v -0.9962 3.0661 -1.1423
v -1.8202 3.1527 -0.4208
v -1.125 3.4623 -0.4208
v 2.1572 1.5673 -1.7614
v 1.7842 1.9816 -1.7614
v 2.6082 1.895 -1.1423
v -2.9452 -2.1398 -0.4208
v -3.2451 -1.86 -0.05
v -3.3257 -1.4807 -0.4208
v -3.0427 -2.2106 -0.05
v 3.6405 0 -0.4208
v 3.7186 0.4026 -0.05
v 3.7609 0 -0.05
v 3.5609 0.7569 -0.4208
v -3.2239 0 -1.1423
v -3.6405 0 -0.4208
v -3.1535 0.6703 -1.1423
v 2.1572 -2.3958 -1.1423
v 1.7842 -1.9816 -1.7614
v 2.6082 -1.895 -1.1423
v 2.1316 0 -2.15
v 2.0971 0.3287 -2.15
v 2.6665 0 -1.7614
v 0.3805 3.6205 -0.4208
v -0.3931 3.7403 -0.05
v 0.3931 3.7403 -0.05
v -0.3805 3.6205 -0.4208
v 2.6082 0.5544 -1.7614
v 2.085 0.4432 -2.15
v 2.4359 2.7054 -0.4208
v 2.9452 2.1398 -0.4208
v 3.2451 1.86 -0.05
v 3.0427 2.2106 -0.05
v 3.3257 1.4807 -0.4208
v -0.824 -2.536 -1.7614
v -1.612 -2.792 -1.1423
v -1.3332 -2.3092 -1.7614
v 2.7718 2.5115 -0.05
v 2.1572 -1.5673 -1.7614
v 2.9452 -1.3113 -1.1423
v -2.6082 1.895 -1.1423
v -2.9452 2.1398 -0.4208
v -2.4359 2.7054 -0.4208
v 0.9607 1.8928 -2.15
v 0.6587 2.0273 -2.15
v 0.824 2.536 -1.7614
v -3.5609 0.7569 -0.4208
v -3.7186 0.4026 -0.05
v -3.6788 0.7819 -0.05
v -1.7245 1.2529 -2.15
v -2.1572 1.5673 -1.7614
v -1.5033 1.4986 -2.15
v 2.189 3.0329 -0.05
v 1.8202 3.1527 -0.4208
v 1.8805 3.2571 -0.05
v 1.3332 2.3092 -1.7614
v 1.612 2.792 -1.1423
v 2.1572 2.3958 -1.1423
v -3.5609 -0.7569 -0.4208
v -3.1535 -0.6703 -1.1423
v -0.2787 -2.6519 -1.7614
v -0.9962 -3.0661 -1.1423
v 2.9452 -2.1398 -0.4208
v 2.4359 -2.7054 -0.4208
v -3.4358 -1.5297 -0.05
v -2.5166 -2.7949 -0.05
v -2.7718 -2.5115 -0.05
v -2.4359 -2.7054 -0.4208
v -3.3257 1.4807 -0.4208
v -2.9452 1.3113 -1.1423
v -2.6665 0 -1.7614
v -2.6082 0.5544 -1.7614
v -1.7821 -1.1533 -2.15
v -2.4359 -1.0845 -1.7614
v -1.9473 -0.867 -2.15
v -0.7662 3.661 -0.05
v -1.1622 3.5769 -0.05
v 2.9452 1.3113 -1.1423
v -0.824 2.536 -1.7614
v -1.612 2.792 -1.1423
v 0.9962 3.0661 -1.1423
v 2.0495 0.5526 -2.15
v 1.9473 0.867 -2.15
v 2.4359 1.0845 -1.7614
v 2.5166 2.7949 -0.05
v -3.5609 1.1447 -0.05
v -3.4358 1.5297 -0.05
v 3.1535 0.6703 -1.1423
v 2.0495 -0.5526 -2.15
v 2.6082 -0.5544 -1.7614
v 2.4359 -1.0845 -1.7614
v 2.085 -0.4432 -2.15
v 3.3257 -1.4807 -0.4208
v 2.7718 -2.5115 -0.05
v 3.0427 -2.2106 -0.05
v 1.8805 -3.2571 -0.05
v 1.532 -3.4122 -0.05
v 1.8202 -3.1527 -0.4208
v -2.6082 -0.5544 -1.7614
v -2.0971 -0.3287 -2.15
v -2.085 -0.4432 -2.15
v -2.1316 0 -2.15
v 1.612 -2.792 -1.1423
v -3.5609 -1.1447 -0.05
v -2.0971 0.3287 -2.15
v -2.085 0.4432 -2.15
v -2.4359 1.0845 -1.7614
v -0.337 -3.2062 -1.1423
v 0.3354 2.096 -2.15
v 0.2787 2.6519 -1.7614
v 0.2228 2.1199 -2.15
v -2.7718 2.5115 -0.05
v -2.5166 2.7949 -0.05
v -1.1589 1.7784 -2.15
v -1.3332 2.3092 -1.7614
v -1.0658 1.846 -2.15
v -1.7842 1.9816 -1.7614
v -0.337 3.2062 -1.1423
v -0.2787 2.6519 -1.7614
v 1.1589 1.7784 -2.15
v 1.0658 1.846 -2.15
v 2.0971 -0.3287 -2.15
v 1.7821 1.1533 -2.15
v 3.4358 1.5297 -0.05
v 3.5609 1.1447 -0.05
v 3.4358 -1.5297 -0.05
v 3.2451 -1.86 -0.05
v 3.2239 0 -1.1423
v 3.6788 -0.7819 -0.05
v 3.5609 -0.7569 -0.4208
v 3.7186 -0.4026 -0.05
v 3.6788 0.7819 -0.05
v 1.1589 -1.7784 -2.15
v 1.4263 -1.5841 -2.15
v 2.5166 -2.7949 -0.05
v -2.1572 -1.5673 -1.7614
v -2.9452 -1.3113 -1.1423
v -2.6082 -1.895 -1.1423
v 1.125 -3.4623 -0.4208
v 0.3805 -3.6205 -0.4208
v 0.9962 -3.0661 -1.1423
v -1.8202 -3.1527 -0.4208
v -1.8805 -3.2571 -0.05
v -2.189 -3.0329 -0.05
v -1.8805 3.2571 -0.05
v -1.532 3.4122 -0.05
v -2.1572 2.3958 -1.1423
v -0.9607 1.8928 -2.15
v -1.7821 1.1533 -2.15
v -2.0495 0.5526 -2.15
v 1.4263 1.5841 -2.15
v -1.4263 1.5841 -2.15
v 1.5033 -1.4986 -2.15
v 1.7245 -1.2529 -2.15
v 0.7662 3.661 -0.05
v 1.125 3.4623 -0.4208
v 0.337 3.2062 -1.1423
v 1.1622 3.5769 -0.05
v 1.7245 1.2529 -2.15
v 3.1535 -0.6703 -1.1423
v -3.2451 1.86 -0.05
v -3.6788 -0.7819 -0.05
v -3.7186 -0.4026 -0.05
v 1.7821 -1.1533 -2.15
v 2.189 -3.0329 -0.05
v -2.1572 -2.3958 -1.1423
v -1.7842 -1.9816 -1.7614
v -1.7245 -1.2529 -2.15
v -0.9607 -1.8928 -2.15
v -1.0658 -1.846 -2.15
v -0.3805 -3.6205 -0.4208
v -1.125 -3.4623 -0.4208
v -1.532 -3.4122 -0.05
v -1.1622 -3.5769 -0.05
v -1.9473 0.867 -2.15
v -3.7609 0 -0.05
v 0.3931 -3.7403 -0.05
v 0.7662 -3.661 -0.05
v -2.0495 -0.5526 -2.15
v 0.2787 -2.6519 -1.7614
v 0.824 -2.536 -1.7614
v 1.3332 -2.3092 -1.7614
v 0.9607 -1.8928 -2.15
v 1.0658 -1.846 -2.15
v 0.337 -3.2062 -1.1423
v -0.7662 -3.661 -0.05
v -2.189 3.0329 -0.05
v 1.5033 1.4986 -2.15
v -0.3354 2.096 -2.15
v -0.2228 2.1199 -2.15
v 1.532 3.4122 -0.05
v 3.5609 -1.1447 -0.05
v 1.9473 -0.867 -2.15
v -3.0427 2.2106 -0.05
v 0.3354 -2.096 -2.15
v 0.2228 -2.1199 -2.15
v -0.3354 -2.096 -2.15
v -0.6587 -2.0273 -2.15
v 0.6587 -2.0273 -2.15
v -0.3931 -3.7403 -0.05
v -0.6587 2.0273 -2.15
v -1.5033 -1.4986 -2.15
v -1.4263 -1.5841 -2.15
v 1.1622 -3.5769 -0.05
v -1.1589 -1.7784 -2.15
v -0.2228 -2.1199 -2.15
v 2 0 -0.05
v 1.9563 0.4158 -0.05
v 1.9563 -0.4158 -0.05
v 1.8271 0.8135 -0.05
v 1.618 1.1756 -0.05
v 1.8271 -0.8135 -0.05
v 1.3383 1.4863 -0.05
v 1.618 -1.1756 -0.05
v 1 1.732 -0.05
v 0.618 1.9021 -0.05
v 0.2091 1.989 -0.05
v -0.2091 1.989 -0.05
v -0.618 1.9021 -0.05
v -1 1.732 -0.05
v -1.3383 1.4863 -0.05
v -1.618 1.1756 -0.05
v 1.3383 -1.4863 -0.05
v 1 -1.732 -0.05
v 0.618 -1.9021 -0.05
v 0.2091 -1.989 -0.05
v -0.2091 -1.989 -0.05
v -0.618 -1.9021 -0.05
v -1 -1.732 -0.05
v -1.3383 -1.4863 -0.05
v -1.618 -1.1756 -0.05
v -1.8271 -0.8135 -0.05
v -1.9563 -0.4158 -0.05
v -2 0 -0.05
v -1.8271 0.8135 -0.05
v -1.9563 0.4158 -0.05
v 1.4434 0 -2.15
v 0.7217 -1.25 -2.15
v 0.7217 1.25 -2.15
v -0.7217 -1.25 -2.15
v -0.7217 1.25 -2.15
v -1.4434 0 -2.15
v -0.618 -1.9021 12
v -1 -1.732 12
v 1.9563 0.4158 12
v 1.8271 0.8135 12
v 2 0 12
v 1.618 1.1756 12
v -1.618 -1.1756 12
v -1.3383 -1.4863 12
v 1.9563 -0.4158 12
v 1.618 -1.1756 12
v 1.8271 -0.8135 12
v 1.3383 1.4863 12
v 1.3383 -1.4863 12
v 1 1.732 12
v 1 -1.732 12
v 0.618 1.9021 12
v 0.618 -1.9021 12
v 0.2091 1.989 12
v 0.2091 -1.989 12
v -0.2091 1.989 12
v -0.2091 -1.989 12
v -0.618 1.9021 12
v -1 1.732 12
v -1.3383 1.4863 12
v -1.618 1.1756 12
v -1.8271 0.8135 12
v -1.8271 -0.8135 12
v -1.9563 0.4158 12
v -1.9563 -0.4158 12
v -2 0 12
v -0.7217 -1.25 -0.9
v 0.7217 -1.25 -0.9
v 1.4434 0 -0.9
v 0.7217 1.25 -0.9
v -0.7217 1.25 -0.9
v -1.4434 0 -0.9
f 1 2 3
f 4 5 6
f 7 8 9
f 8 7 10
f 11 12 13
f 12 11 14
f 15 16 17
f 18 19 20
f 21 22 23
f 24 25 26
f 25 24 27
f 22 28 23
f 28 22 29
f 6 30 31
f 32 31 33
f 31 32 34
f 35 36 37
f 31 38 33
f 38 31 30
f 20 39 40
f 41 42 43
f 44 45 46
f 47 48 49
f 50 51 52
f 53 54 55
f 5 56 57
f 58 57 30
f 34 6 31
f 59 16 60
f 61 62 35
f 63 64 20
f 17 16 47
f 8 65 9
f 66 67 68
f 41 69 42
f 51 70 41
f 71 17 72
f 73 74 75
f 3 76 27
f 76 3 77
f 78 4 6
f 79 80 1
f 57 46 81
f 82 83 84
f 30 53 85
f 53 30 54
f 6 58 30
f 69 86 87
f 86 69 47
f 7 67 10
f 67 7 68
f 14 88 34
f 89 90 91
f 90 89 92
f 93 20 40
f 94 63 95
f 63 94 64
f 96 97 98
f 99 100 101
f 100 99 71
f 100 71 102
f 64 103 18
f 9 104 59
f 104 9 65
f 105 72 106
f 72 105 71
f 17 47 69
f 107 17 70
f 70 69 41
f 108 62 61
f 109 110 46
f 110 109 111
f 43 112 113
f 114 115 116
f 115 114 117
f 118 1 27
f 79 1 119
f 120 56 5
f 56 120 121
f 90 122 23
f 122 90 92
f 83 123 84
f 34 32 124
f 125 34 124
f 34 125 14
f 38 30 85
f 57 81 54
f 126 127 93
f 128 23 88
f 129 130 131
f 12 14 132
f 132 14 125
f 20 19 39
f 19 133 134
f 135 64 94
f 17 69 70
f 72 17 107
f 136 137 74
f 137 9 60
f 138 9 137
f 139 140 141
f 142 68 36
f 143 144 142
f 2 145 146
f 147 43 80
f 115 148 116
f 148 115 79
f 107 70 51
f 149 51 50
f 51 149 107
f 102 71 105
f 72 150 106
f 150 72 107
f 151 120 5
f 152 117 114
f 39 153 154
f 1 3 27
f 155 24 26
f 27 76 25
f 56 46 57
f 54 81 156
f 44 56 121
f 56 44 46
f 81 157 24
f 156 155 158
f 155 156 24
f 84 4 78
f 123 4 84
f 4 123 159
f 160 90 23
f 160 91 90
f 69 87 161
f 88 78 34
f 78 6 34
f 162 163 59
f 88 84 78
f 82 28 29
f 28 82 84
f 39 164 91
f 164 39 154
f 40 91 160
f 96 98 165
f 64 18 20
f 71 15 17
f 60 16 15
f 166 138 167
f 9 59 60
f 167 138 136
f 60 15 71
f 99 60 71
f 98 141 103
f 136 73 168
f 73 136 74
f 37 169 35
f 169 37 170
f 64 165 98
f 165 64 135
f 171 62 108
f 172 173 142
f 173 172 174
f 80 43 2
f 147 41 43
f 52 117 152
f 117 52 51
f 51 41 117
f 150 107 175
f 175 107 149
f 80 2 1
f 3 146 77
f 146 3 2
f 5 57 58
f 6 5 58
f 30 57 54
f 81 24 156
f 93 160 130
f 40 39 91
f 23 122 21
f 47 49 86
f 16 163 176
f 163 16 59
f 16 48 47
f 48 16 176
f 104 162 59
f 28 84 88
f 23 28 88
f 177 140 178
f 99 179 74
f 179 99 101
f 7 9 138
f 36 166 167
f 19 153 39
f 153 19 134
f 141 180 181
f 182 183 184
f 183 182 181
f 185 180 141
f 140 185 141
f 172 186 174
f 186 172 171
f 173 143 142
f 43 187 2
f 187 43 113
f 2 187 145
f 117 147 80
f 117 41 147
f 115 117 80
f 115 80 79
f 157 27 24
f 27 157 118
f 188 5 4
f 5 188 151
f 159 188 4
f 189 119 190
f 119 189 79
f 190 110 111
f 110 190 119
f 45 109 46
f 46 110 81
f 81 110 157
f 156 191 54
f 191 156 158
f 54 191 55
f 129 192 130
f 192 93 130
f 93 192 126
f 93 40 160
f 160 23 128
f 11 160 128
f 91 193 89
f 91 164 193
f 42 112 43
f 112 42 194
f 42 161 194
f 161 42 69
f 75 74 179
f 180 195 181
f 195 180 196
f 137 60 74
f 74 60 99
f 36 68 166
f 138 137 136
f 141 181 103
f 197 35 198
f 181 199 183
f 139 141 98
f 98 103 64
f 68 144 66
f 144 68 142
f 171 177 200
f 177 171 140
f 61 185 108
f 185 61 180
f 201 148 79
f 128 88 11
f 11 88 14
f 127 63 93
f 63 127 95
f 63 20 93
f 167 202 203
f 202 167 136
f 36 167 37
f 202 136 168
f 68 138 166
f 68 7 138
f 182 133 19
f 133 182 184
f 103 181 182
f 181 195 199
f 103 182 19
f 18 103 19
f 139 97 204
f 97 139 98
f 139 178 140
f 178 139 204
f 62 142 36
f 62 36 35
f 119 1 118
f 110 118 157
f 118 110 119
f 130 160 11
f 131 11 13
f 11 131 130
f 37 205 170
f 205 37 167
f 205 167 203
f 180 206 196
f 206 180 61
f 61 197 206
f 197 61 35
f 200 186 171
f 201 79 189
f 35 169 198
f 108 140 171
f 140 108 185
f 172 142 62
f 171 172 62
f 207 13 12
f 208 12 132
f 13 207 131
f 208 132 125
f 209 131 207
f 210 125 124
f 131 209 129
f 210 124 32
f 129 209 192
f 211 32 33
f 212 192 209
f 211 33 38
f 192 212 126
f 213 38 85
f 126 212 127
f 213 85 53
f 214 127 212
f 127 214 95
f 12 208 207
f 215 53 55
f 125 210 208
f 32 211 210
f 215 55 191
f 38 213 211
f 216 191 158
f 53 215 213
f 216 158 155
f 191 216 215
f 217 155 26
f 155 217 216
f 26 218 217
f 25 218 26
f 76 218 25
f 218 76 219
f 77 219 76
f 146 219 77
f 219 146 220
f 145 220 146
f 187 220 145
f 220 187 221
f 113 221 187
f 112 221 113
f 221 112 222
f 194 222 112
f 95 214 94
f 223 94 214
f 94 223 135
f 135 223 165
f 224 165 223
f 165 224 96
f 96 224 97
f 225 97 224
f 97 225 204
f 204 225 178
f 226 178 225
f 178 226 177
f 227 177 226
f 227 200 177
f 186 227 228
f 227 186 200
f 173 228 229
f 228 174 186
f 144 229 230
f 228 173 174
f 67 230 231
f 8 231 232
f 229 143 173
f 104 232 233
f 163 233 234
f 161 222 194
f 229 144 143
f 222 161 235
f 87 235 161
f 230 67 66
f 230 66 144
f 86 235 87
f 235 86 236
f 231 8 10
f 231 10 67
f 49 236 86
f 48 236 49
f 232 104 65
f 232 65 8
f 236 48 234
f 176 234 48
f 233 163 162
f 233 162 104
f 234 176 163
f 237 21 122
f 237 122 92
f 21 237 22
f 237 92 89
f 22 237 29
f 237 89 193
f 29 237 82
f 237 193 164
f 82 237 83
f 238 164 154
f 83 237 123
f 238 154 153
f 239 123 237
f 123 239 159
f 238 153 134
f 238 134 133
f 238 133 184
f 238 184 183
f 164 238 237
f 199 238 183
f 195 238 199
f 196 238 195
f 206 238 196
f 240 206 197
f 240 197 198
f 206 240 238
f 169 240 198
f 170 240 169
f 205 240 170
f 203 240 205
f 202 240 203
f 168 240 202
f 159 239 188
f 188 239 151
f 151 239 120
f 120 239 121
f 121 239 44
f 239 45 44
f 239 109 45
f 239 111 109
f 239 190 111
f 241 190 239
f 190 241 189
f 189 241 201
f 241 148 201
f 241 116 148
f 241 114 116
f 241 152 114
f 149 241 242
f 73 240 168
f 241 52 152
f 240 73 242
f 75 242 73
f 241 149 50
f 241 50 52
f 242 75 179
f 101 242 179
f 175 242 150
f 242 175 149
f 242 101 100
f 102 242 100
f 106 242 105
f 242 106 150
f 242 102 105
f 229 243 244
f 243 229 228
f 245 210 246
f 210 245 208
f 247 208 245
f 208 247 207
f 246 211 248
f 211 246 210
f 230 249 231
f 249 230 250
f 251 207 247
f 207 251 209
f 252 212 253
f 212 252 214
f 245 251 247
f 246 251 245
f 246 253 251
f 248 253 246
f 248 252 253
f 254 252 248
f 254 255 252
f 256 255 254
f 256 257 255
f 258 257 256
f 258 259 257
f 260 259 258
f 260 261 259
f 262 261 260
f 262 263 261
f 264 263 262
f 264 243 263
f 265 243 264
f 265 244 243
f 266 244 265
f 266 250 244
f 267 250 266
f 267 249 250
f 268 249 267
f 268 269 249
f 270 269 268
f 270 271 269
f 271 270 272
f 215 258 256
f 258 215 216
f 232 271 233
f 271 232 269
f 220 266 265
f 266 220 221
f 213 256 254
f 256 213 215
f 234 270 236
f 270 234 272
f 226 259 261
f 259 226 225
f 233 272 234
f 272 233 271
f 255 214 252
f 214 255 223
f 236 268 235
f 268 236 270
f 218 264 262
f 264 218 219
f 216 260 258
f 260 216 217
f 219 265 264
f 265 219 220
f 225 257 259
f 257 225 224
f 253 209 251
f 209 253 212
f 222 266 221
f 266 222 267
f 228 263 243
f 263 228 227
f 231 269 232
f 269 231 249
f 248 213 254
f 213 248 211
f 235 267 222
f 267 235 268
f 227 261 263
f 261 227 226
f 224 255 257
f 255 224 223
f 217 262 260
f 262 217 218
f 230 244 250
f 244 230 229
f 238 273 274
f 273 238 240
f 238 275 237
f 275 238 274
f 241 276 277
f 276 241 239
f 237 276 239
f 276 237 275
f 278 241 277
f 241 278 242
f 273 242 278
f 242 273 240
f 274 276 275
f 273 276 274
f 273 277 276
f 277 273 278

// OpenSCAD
/*
   Copyright 2018 Scott Bezek and the splitflap contributors

   Licensed under the Apache License, Version 2.0 (the "License");
   you may not use this file except in compliance with the License.
   You may obtain a copy of the License at

       http://www.apache.org/licenses/LICENSE-2.0

   Unless required by applicable law or agreed to in writing, software
   distributed under the License is distributed on an "AS IS" BASIS,
   WITHOUT WARRANTIES OR CONDITIONS OF ANY KIND, either express or implied.
   See the License for the specific language governing permissions and
   limitations under the License.
*/

module roughM4_7380(length) {
    eps = 0.1;
    thread_diameter = 4;
    head_diameter = 7.6;
    head_length = 2.2;
    driving_depth = 1.3;
    driving_apothem = 2.5/2;
    driving_radius = driving_apothem / cos(180/6);

    sphere_offset = 1.2;  // Just a guess
    sphere_radius = sqrt(sphere_offset*sphere_offset + (head_diameter/2)*(head_diameter/2));


    difference() {
        union() {
            translate([0, 0, -eps]) {
                cylinder(h=length+eps, d=thread_diameter, $fn=30);
            }
            difference() {
                translate([0, 0, sphere_offset]) {
                    sphere(sphere_radius, $fn=30);
                }
                translate([0, 0, sphere_radius]) {
                    cube([sphere_radius*2 + eps, sphere_radius*2 + eps, sphere_radius*2 + eps], center=true);
                }
                translate([0, 0, -sphere_radius - head_length]) {
                    cube([sphere_radius*2 + eps, sphere_radius*2 + eps, sphere_radius*2 + eps], center=true);
                }
            }
        }
        translate([0, 0, -head_length-eps]) {
            cylinder(h=driving_depth+eps, r=driving_radius, $fn=6);
        }
    }
}

roughM4_7380(12);

        module color_selector(c) {
            precision = 0.0000001;  // arbitrary
            function compare_floats(x, y, i=0) = 
                  (len(x) != len(y)) ? false  // if arrays differ in length, they can't be equal
                : (i >= len(x)) ? true  // if we've hit the end of the arrays without issue, we're equal
                : (x[i] - precision <= y[i]) && x[i] + precision >= y[i]
                    ? compare_floats(x, y, i+1)
                    : false;  // not equal, short circuit

            if (c == [0, 0, 0] || compare_floats(c, [0, 0, 0]))
                children();
        }
                    
